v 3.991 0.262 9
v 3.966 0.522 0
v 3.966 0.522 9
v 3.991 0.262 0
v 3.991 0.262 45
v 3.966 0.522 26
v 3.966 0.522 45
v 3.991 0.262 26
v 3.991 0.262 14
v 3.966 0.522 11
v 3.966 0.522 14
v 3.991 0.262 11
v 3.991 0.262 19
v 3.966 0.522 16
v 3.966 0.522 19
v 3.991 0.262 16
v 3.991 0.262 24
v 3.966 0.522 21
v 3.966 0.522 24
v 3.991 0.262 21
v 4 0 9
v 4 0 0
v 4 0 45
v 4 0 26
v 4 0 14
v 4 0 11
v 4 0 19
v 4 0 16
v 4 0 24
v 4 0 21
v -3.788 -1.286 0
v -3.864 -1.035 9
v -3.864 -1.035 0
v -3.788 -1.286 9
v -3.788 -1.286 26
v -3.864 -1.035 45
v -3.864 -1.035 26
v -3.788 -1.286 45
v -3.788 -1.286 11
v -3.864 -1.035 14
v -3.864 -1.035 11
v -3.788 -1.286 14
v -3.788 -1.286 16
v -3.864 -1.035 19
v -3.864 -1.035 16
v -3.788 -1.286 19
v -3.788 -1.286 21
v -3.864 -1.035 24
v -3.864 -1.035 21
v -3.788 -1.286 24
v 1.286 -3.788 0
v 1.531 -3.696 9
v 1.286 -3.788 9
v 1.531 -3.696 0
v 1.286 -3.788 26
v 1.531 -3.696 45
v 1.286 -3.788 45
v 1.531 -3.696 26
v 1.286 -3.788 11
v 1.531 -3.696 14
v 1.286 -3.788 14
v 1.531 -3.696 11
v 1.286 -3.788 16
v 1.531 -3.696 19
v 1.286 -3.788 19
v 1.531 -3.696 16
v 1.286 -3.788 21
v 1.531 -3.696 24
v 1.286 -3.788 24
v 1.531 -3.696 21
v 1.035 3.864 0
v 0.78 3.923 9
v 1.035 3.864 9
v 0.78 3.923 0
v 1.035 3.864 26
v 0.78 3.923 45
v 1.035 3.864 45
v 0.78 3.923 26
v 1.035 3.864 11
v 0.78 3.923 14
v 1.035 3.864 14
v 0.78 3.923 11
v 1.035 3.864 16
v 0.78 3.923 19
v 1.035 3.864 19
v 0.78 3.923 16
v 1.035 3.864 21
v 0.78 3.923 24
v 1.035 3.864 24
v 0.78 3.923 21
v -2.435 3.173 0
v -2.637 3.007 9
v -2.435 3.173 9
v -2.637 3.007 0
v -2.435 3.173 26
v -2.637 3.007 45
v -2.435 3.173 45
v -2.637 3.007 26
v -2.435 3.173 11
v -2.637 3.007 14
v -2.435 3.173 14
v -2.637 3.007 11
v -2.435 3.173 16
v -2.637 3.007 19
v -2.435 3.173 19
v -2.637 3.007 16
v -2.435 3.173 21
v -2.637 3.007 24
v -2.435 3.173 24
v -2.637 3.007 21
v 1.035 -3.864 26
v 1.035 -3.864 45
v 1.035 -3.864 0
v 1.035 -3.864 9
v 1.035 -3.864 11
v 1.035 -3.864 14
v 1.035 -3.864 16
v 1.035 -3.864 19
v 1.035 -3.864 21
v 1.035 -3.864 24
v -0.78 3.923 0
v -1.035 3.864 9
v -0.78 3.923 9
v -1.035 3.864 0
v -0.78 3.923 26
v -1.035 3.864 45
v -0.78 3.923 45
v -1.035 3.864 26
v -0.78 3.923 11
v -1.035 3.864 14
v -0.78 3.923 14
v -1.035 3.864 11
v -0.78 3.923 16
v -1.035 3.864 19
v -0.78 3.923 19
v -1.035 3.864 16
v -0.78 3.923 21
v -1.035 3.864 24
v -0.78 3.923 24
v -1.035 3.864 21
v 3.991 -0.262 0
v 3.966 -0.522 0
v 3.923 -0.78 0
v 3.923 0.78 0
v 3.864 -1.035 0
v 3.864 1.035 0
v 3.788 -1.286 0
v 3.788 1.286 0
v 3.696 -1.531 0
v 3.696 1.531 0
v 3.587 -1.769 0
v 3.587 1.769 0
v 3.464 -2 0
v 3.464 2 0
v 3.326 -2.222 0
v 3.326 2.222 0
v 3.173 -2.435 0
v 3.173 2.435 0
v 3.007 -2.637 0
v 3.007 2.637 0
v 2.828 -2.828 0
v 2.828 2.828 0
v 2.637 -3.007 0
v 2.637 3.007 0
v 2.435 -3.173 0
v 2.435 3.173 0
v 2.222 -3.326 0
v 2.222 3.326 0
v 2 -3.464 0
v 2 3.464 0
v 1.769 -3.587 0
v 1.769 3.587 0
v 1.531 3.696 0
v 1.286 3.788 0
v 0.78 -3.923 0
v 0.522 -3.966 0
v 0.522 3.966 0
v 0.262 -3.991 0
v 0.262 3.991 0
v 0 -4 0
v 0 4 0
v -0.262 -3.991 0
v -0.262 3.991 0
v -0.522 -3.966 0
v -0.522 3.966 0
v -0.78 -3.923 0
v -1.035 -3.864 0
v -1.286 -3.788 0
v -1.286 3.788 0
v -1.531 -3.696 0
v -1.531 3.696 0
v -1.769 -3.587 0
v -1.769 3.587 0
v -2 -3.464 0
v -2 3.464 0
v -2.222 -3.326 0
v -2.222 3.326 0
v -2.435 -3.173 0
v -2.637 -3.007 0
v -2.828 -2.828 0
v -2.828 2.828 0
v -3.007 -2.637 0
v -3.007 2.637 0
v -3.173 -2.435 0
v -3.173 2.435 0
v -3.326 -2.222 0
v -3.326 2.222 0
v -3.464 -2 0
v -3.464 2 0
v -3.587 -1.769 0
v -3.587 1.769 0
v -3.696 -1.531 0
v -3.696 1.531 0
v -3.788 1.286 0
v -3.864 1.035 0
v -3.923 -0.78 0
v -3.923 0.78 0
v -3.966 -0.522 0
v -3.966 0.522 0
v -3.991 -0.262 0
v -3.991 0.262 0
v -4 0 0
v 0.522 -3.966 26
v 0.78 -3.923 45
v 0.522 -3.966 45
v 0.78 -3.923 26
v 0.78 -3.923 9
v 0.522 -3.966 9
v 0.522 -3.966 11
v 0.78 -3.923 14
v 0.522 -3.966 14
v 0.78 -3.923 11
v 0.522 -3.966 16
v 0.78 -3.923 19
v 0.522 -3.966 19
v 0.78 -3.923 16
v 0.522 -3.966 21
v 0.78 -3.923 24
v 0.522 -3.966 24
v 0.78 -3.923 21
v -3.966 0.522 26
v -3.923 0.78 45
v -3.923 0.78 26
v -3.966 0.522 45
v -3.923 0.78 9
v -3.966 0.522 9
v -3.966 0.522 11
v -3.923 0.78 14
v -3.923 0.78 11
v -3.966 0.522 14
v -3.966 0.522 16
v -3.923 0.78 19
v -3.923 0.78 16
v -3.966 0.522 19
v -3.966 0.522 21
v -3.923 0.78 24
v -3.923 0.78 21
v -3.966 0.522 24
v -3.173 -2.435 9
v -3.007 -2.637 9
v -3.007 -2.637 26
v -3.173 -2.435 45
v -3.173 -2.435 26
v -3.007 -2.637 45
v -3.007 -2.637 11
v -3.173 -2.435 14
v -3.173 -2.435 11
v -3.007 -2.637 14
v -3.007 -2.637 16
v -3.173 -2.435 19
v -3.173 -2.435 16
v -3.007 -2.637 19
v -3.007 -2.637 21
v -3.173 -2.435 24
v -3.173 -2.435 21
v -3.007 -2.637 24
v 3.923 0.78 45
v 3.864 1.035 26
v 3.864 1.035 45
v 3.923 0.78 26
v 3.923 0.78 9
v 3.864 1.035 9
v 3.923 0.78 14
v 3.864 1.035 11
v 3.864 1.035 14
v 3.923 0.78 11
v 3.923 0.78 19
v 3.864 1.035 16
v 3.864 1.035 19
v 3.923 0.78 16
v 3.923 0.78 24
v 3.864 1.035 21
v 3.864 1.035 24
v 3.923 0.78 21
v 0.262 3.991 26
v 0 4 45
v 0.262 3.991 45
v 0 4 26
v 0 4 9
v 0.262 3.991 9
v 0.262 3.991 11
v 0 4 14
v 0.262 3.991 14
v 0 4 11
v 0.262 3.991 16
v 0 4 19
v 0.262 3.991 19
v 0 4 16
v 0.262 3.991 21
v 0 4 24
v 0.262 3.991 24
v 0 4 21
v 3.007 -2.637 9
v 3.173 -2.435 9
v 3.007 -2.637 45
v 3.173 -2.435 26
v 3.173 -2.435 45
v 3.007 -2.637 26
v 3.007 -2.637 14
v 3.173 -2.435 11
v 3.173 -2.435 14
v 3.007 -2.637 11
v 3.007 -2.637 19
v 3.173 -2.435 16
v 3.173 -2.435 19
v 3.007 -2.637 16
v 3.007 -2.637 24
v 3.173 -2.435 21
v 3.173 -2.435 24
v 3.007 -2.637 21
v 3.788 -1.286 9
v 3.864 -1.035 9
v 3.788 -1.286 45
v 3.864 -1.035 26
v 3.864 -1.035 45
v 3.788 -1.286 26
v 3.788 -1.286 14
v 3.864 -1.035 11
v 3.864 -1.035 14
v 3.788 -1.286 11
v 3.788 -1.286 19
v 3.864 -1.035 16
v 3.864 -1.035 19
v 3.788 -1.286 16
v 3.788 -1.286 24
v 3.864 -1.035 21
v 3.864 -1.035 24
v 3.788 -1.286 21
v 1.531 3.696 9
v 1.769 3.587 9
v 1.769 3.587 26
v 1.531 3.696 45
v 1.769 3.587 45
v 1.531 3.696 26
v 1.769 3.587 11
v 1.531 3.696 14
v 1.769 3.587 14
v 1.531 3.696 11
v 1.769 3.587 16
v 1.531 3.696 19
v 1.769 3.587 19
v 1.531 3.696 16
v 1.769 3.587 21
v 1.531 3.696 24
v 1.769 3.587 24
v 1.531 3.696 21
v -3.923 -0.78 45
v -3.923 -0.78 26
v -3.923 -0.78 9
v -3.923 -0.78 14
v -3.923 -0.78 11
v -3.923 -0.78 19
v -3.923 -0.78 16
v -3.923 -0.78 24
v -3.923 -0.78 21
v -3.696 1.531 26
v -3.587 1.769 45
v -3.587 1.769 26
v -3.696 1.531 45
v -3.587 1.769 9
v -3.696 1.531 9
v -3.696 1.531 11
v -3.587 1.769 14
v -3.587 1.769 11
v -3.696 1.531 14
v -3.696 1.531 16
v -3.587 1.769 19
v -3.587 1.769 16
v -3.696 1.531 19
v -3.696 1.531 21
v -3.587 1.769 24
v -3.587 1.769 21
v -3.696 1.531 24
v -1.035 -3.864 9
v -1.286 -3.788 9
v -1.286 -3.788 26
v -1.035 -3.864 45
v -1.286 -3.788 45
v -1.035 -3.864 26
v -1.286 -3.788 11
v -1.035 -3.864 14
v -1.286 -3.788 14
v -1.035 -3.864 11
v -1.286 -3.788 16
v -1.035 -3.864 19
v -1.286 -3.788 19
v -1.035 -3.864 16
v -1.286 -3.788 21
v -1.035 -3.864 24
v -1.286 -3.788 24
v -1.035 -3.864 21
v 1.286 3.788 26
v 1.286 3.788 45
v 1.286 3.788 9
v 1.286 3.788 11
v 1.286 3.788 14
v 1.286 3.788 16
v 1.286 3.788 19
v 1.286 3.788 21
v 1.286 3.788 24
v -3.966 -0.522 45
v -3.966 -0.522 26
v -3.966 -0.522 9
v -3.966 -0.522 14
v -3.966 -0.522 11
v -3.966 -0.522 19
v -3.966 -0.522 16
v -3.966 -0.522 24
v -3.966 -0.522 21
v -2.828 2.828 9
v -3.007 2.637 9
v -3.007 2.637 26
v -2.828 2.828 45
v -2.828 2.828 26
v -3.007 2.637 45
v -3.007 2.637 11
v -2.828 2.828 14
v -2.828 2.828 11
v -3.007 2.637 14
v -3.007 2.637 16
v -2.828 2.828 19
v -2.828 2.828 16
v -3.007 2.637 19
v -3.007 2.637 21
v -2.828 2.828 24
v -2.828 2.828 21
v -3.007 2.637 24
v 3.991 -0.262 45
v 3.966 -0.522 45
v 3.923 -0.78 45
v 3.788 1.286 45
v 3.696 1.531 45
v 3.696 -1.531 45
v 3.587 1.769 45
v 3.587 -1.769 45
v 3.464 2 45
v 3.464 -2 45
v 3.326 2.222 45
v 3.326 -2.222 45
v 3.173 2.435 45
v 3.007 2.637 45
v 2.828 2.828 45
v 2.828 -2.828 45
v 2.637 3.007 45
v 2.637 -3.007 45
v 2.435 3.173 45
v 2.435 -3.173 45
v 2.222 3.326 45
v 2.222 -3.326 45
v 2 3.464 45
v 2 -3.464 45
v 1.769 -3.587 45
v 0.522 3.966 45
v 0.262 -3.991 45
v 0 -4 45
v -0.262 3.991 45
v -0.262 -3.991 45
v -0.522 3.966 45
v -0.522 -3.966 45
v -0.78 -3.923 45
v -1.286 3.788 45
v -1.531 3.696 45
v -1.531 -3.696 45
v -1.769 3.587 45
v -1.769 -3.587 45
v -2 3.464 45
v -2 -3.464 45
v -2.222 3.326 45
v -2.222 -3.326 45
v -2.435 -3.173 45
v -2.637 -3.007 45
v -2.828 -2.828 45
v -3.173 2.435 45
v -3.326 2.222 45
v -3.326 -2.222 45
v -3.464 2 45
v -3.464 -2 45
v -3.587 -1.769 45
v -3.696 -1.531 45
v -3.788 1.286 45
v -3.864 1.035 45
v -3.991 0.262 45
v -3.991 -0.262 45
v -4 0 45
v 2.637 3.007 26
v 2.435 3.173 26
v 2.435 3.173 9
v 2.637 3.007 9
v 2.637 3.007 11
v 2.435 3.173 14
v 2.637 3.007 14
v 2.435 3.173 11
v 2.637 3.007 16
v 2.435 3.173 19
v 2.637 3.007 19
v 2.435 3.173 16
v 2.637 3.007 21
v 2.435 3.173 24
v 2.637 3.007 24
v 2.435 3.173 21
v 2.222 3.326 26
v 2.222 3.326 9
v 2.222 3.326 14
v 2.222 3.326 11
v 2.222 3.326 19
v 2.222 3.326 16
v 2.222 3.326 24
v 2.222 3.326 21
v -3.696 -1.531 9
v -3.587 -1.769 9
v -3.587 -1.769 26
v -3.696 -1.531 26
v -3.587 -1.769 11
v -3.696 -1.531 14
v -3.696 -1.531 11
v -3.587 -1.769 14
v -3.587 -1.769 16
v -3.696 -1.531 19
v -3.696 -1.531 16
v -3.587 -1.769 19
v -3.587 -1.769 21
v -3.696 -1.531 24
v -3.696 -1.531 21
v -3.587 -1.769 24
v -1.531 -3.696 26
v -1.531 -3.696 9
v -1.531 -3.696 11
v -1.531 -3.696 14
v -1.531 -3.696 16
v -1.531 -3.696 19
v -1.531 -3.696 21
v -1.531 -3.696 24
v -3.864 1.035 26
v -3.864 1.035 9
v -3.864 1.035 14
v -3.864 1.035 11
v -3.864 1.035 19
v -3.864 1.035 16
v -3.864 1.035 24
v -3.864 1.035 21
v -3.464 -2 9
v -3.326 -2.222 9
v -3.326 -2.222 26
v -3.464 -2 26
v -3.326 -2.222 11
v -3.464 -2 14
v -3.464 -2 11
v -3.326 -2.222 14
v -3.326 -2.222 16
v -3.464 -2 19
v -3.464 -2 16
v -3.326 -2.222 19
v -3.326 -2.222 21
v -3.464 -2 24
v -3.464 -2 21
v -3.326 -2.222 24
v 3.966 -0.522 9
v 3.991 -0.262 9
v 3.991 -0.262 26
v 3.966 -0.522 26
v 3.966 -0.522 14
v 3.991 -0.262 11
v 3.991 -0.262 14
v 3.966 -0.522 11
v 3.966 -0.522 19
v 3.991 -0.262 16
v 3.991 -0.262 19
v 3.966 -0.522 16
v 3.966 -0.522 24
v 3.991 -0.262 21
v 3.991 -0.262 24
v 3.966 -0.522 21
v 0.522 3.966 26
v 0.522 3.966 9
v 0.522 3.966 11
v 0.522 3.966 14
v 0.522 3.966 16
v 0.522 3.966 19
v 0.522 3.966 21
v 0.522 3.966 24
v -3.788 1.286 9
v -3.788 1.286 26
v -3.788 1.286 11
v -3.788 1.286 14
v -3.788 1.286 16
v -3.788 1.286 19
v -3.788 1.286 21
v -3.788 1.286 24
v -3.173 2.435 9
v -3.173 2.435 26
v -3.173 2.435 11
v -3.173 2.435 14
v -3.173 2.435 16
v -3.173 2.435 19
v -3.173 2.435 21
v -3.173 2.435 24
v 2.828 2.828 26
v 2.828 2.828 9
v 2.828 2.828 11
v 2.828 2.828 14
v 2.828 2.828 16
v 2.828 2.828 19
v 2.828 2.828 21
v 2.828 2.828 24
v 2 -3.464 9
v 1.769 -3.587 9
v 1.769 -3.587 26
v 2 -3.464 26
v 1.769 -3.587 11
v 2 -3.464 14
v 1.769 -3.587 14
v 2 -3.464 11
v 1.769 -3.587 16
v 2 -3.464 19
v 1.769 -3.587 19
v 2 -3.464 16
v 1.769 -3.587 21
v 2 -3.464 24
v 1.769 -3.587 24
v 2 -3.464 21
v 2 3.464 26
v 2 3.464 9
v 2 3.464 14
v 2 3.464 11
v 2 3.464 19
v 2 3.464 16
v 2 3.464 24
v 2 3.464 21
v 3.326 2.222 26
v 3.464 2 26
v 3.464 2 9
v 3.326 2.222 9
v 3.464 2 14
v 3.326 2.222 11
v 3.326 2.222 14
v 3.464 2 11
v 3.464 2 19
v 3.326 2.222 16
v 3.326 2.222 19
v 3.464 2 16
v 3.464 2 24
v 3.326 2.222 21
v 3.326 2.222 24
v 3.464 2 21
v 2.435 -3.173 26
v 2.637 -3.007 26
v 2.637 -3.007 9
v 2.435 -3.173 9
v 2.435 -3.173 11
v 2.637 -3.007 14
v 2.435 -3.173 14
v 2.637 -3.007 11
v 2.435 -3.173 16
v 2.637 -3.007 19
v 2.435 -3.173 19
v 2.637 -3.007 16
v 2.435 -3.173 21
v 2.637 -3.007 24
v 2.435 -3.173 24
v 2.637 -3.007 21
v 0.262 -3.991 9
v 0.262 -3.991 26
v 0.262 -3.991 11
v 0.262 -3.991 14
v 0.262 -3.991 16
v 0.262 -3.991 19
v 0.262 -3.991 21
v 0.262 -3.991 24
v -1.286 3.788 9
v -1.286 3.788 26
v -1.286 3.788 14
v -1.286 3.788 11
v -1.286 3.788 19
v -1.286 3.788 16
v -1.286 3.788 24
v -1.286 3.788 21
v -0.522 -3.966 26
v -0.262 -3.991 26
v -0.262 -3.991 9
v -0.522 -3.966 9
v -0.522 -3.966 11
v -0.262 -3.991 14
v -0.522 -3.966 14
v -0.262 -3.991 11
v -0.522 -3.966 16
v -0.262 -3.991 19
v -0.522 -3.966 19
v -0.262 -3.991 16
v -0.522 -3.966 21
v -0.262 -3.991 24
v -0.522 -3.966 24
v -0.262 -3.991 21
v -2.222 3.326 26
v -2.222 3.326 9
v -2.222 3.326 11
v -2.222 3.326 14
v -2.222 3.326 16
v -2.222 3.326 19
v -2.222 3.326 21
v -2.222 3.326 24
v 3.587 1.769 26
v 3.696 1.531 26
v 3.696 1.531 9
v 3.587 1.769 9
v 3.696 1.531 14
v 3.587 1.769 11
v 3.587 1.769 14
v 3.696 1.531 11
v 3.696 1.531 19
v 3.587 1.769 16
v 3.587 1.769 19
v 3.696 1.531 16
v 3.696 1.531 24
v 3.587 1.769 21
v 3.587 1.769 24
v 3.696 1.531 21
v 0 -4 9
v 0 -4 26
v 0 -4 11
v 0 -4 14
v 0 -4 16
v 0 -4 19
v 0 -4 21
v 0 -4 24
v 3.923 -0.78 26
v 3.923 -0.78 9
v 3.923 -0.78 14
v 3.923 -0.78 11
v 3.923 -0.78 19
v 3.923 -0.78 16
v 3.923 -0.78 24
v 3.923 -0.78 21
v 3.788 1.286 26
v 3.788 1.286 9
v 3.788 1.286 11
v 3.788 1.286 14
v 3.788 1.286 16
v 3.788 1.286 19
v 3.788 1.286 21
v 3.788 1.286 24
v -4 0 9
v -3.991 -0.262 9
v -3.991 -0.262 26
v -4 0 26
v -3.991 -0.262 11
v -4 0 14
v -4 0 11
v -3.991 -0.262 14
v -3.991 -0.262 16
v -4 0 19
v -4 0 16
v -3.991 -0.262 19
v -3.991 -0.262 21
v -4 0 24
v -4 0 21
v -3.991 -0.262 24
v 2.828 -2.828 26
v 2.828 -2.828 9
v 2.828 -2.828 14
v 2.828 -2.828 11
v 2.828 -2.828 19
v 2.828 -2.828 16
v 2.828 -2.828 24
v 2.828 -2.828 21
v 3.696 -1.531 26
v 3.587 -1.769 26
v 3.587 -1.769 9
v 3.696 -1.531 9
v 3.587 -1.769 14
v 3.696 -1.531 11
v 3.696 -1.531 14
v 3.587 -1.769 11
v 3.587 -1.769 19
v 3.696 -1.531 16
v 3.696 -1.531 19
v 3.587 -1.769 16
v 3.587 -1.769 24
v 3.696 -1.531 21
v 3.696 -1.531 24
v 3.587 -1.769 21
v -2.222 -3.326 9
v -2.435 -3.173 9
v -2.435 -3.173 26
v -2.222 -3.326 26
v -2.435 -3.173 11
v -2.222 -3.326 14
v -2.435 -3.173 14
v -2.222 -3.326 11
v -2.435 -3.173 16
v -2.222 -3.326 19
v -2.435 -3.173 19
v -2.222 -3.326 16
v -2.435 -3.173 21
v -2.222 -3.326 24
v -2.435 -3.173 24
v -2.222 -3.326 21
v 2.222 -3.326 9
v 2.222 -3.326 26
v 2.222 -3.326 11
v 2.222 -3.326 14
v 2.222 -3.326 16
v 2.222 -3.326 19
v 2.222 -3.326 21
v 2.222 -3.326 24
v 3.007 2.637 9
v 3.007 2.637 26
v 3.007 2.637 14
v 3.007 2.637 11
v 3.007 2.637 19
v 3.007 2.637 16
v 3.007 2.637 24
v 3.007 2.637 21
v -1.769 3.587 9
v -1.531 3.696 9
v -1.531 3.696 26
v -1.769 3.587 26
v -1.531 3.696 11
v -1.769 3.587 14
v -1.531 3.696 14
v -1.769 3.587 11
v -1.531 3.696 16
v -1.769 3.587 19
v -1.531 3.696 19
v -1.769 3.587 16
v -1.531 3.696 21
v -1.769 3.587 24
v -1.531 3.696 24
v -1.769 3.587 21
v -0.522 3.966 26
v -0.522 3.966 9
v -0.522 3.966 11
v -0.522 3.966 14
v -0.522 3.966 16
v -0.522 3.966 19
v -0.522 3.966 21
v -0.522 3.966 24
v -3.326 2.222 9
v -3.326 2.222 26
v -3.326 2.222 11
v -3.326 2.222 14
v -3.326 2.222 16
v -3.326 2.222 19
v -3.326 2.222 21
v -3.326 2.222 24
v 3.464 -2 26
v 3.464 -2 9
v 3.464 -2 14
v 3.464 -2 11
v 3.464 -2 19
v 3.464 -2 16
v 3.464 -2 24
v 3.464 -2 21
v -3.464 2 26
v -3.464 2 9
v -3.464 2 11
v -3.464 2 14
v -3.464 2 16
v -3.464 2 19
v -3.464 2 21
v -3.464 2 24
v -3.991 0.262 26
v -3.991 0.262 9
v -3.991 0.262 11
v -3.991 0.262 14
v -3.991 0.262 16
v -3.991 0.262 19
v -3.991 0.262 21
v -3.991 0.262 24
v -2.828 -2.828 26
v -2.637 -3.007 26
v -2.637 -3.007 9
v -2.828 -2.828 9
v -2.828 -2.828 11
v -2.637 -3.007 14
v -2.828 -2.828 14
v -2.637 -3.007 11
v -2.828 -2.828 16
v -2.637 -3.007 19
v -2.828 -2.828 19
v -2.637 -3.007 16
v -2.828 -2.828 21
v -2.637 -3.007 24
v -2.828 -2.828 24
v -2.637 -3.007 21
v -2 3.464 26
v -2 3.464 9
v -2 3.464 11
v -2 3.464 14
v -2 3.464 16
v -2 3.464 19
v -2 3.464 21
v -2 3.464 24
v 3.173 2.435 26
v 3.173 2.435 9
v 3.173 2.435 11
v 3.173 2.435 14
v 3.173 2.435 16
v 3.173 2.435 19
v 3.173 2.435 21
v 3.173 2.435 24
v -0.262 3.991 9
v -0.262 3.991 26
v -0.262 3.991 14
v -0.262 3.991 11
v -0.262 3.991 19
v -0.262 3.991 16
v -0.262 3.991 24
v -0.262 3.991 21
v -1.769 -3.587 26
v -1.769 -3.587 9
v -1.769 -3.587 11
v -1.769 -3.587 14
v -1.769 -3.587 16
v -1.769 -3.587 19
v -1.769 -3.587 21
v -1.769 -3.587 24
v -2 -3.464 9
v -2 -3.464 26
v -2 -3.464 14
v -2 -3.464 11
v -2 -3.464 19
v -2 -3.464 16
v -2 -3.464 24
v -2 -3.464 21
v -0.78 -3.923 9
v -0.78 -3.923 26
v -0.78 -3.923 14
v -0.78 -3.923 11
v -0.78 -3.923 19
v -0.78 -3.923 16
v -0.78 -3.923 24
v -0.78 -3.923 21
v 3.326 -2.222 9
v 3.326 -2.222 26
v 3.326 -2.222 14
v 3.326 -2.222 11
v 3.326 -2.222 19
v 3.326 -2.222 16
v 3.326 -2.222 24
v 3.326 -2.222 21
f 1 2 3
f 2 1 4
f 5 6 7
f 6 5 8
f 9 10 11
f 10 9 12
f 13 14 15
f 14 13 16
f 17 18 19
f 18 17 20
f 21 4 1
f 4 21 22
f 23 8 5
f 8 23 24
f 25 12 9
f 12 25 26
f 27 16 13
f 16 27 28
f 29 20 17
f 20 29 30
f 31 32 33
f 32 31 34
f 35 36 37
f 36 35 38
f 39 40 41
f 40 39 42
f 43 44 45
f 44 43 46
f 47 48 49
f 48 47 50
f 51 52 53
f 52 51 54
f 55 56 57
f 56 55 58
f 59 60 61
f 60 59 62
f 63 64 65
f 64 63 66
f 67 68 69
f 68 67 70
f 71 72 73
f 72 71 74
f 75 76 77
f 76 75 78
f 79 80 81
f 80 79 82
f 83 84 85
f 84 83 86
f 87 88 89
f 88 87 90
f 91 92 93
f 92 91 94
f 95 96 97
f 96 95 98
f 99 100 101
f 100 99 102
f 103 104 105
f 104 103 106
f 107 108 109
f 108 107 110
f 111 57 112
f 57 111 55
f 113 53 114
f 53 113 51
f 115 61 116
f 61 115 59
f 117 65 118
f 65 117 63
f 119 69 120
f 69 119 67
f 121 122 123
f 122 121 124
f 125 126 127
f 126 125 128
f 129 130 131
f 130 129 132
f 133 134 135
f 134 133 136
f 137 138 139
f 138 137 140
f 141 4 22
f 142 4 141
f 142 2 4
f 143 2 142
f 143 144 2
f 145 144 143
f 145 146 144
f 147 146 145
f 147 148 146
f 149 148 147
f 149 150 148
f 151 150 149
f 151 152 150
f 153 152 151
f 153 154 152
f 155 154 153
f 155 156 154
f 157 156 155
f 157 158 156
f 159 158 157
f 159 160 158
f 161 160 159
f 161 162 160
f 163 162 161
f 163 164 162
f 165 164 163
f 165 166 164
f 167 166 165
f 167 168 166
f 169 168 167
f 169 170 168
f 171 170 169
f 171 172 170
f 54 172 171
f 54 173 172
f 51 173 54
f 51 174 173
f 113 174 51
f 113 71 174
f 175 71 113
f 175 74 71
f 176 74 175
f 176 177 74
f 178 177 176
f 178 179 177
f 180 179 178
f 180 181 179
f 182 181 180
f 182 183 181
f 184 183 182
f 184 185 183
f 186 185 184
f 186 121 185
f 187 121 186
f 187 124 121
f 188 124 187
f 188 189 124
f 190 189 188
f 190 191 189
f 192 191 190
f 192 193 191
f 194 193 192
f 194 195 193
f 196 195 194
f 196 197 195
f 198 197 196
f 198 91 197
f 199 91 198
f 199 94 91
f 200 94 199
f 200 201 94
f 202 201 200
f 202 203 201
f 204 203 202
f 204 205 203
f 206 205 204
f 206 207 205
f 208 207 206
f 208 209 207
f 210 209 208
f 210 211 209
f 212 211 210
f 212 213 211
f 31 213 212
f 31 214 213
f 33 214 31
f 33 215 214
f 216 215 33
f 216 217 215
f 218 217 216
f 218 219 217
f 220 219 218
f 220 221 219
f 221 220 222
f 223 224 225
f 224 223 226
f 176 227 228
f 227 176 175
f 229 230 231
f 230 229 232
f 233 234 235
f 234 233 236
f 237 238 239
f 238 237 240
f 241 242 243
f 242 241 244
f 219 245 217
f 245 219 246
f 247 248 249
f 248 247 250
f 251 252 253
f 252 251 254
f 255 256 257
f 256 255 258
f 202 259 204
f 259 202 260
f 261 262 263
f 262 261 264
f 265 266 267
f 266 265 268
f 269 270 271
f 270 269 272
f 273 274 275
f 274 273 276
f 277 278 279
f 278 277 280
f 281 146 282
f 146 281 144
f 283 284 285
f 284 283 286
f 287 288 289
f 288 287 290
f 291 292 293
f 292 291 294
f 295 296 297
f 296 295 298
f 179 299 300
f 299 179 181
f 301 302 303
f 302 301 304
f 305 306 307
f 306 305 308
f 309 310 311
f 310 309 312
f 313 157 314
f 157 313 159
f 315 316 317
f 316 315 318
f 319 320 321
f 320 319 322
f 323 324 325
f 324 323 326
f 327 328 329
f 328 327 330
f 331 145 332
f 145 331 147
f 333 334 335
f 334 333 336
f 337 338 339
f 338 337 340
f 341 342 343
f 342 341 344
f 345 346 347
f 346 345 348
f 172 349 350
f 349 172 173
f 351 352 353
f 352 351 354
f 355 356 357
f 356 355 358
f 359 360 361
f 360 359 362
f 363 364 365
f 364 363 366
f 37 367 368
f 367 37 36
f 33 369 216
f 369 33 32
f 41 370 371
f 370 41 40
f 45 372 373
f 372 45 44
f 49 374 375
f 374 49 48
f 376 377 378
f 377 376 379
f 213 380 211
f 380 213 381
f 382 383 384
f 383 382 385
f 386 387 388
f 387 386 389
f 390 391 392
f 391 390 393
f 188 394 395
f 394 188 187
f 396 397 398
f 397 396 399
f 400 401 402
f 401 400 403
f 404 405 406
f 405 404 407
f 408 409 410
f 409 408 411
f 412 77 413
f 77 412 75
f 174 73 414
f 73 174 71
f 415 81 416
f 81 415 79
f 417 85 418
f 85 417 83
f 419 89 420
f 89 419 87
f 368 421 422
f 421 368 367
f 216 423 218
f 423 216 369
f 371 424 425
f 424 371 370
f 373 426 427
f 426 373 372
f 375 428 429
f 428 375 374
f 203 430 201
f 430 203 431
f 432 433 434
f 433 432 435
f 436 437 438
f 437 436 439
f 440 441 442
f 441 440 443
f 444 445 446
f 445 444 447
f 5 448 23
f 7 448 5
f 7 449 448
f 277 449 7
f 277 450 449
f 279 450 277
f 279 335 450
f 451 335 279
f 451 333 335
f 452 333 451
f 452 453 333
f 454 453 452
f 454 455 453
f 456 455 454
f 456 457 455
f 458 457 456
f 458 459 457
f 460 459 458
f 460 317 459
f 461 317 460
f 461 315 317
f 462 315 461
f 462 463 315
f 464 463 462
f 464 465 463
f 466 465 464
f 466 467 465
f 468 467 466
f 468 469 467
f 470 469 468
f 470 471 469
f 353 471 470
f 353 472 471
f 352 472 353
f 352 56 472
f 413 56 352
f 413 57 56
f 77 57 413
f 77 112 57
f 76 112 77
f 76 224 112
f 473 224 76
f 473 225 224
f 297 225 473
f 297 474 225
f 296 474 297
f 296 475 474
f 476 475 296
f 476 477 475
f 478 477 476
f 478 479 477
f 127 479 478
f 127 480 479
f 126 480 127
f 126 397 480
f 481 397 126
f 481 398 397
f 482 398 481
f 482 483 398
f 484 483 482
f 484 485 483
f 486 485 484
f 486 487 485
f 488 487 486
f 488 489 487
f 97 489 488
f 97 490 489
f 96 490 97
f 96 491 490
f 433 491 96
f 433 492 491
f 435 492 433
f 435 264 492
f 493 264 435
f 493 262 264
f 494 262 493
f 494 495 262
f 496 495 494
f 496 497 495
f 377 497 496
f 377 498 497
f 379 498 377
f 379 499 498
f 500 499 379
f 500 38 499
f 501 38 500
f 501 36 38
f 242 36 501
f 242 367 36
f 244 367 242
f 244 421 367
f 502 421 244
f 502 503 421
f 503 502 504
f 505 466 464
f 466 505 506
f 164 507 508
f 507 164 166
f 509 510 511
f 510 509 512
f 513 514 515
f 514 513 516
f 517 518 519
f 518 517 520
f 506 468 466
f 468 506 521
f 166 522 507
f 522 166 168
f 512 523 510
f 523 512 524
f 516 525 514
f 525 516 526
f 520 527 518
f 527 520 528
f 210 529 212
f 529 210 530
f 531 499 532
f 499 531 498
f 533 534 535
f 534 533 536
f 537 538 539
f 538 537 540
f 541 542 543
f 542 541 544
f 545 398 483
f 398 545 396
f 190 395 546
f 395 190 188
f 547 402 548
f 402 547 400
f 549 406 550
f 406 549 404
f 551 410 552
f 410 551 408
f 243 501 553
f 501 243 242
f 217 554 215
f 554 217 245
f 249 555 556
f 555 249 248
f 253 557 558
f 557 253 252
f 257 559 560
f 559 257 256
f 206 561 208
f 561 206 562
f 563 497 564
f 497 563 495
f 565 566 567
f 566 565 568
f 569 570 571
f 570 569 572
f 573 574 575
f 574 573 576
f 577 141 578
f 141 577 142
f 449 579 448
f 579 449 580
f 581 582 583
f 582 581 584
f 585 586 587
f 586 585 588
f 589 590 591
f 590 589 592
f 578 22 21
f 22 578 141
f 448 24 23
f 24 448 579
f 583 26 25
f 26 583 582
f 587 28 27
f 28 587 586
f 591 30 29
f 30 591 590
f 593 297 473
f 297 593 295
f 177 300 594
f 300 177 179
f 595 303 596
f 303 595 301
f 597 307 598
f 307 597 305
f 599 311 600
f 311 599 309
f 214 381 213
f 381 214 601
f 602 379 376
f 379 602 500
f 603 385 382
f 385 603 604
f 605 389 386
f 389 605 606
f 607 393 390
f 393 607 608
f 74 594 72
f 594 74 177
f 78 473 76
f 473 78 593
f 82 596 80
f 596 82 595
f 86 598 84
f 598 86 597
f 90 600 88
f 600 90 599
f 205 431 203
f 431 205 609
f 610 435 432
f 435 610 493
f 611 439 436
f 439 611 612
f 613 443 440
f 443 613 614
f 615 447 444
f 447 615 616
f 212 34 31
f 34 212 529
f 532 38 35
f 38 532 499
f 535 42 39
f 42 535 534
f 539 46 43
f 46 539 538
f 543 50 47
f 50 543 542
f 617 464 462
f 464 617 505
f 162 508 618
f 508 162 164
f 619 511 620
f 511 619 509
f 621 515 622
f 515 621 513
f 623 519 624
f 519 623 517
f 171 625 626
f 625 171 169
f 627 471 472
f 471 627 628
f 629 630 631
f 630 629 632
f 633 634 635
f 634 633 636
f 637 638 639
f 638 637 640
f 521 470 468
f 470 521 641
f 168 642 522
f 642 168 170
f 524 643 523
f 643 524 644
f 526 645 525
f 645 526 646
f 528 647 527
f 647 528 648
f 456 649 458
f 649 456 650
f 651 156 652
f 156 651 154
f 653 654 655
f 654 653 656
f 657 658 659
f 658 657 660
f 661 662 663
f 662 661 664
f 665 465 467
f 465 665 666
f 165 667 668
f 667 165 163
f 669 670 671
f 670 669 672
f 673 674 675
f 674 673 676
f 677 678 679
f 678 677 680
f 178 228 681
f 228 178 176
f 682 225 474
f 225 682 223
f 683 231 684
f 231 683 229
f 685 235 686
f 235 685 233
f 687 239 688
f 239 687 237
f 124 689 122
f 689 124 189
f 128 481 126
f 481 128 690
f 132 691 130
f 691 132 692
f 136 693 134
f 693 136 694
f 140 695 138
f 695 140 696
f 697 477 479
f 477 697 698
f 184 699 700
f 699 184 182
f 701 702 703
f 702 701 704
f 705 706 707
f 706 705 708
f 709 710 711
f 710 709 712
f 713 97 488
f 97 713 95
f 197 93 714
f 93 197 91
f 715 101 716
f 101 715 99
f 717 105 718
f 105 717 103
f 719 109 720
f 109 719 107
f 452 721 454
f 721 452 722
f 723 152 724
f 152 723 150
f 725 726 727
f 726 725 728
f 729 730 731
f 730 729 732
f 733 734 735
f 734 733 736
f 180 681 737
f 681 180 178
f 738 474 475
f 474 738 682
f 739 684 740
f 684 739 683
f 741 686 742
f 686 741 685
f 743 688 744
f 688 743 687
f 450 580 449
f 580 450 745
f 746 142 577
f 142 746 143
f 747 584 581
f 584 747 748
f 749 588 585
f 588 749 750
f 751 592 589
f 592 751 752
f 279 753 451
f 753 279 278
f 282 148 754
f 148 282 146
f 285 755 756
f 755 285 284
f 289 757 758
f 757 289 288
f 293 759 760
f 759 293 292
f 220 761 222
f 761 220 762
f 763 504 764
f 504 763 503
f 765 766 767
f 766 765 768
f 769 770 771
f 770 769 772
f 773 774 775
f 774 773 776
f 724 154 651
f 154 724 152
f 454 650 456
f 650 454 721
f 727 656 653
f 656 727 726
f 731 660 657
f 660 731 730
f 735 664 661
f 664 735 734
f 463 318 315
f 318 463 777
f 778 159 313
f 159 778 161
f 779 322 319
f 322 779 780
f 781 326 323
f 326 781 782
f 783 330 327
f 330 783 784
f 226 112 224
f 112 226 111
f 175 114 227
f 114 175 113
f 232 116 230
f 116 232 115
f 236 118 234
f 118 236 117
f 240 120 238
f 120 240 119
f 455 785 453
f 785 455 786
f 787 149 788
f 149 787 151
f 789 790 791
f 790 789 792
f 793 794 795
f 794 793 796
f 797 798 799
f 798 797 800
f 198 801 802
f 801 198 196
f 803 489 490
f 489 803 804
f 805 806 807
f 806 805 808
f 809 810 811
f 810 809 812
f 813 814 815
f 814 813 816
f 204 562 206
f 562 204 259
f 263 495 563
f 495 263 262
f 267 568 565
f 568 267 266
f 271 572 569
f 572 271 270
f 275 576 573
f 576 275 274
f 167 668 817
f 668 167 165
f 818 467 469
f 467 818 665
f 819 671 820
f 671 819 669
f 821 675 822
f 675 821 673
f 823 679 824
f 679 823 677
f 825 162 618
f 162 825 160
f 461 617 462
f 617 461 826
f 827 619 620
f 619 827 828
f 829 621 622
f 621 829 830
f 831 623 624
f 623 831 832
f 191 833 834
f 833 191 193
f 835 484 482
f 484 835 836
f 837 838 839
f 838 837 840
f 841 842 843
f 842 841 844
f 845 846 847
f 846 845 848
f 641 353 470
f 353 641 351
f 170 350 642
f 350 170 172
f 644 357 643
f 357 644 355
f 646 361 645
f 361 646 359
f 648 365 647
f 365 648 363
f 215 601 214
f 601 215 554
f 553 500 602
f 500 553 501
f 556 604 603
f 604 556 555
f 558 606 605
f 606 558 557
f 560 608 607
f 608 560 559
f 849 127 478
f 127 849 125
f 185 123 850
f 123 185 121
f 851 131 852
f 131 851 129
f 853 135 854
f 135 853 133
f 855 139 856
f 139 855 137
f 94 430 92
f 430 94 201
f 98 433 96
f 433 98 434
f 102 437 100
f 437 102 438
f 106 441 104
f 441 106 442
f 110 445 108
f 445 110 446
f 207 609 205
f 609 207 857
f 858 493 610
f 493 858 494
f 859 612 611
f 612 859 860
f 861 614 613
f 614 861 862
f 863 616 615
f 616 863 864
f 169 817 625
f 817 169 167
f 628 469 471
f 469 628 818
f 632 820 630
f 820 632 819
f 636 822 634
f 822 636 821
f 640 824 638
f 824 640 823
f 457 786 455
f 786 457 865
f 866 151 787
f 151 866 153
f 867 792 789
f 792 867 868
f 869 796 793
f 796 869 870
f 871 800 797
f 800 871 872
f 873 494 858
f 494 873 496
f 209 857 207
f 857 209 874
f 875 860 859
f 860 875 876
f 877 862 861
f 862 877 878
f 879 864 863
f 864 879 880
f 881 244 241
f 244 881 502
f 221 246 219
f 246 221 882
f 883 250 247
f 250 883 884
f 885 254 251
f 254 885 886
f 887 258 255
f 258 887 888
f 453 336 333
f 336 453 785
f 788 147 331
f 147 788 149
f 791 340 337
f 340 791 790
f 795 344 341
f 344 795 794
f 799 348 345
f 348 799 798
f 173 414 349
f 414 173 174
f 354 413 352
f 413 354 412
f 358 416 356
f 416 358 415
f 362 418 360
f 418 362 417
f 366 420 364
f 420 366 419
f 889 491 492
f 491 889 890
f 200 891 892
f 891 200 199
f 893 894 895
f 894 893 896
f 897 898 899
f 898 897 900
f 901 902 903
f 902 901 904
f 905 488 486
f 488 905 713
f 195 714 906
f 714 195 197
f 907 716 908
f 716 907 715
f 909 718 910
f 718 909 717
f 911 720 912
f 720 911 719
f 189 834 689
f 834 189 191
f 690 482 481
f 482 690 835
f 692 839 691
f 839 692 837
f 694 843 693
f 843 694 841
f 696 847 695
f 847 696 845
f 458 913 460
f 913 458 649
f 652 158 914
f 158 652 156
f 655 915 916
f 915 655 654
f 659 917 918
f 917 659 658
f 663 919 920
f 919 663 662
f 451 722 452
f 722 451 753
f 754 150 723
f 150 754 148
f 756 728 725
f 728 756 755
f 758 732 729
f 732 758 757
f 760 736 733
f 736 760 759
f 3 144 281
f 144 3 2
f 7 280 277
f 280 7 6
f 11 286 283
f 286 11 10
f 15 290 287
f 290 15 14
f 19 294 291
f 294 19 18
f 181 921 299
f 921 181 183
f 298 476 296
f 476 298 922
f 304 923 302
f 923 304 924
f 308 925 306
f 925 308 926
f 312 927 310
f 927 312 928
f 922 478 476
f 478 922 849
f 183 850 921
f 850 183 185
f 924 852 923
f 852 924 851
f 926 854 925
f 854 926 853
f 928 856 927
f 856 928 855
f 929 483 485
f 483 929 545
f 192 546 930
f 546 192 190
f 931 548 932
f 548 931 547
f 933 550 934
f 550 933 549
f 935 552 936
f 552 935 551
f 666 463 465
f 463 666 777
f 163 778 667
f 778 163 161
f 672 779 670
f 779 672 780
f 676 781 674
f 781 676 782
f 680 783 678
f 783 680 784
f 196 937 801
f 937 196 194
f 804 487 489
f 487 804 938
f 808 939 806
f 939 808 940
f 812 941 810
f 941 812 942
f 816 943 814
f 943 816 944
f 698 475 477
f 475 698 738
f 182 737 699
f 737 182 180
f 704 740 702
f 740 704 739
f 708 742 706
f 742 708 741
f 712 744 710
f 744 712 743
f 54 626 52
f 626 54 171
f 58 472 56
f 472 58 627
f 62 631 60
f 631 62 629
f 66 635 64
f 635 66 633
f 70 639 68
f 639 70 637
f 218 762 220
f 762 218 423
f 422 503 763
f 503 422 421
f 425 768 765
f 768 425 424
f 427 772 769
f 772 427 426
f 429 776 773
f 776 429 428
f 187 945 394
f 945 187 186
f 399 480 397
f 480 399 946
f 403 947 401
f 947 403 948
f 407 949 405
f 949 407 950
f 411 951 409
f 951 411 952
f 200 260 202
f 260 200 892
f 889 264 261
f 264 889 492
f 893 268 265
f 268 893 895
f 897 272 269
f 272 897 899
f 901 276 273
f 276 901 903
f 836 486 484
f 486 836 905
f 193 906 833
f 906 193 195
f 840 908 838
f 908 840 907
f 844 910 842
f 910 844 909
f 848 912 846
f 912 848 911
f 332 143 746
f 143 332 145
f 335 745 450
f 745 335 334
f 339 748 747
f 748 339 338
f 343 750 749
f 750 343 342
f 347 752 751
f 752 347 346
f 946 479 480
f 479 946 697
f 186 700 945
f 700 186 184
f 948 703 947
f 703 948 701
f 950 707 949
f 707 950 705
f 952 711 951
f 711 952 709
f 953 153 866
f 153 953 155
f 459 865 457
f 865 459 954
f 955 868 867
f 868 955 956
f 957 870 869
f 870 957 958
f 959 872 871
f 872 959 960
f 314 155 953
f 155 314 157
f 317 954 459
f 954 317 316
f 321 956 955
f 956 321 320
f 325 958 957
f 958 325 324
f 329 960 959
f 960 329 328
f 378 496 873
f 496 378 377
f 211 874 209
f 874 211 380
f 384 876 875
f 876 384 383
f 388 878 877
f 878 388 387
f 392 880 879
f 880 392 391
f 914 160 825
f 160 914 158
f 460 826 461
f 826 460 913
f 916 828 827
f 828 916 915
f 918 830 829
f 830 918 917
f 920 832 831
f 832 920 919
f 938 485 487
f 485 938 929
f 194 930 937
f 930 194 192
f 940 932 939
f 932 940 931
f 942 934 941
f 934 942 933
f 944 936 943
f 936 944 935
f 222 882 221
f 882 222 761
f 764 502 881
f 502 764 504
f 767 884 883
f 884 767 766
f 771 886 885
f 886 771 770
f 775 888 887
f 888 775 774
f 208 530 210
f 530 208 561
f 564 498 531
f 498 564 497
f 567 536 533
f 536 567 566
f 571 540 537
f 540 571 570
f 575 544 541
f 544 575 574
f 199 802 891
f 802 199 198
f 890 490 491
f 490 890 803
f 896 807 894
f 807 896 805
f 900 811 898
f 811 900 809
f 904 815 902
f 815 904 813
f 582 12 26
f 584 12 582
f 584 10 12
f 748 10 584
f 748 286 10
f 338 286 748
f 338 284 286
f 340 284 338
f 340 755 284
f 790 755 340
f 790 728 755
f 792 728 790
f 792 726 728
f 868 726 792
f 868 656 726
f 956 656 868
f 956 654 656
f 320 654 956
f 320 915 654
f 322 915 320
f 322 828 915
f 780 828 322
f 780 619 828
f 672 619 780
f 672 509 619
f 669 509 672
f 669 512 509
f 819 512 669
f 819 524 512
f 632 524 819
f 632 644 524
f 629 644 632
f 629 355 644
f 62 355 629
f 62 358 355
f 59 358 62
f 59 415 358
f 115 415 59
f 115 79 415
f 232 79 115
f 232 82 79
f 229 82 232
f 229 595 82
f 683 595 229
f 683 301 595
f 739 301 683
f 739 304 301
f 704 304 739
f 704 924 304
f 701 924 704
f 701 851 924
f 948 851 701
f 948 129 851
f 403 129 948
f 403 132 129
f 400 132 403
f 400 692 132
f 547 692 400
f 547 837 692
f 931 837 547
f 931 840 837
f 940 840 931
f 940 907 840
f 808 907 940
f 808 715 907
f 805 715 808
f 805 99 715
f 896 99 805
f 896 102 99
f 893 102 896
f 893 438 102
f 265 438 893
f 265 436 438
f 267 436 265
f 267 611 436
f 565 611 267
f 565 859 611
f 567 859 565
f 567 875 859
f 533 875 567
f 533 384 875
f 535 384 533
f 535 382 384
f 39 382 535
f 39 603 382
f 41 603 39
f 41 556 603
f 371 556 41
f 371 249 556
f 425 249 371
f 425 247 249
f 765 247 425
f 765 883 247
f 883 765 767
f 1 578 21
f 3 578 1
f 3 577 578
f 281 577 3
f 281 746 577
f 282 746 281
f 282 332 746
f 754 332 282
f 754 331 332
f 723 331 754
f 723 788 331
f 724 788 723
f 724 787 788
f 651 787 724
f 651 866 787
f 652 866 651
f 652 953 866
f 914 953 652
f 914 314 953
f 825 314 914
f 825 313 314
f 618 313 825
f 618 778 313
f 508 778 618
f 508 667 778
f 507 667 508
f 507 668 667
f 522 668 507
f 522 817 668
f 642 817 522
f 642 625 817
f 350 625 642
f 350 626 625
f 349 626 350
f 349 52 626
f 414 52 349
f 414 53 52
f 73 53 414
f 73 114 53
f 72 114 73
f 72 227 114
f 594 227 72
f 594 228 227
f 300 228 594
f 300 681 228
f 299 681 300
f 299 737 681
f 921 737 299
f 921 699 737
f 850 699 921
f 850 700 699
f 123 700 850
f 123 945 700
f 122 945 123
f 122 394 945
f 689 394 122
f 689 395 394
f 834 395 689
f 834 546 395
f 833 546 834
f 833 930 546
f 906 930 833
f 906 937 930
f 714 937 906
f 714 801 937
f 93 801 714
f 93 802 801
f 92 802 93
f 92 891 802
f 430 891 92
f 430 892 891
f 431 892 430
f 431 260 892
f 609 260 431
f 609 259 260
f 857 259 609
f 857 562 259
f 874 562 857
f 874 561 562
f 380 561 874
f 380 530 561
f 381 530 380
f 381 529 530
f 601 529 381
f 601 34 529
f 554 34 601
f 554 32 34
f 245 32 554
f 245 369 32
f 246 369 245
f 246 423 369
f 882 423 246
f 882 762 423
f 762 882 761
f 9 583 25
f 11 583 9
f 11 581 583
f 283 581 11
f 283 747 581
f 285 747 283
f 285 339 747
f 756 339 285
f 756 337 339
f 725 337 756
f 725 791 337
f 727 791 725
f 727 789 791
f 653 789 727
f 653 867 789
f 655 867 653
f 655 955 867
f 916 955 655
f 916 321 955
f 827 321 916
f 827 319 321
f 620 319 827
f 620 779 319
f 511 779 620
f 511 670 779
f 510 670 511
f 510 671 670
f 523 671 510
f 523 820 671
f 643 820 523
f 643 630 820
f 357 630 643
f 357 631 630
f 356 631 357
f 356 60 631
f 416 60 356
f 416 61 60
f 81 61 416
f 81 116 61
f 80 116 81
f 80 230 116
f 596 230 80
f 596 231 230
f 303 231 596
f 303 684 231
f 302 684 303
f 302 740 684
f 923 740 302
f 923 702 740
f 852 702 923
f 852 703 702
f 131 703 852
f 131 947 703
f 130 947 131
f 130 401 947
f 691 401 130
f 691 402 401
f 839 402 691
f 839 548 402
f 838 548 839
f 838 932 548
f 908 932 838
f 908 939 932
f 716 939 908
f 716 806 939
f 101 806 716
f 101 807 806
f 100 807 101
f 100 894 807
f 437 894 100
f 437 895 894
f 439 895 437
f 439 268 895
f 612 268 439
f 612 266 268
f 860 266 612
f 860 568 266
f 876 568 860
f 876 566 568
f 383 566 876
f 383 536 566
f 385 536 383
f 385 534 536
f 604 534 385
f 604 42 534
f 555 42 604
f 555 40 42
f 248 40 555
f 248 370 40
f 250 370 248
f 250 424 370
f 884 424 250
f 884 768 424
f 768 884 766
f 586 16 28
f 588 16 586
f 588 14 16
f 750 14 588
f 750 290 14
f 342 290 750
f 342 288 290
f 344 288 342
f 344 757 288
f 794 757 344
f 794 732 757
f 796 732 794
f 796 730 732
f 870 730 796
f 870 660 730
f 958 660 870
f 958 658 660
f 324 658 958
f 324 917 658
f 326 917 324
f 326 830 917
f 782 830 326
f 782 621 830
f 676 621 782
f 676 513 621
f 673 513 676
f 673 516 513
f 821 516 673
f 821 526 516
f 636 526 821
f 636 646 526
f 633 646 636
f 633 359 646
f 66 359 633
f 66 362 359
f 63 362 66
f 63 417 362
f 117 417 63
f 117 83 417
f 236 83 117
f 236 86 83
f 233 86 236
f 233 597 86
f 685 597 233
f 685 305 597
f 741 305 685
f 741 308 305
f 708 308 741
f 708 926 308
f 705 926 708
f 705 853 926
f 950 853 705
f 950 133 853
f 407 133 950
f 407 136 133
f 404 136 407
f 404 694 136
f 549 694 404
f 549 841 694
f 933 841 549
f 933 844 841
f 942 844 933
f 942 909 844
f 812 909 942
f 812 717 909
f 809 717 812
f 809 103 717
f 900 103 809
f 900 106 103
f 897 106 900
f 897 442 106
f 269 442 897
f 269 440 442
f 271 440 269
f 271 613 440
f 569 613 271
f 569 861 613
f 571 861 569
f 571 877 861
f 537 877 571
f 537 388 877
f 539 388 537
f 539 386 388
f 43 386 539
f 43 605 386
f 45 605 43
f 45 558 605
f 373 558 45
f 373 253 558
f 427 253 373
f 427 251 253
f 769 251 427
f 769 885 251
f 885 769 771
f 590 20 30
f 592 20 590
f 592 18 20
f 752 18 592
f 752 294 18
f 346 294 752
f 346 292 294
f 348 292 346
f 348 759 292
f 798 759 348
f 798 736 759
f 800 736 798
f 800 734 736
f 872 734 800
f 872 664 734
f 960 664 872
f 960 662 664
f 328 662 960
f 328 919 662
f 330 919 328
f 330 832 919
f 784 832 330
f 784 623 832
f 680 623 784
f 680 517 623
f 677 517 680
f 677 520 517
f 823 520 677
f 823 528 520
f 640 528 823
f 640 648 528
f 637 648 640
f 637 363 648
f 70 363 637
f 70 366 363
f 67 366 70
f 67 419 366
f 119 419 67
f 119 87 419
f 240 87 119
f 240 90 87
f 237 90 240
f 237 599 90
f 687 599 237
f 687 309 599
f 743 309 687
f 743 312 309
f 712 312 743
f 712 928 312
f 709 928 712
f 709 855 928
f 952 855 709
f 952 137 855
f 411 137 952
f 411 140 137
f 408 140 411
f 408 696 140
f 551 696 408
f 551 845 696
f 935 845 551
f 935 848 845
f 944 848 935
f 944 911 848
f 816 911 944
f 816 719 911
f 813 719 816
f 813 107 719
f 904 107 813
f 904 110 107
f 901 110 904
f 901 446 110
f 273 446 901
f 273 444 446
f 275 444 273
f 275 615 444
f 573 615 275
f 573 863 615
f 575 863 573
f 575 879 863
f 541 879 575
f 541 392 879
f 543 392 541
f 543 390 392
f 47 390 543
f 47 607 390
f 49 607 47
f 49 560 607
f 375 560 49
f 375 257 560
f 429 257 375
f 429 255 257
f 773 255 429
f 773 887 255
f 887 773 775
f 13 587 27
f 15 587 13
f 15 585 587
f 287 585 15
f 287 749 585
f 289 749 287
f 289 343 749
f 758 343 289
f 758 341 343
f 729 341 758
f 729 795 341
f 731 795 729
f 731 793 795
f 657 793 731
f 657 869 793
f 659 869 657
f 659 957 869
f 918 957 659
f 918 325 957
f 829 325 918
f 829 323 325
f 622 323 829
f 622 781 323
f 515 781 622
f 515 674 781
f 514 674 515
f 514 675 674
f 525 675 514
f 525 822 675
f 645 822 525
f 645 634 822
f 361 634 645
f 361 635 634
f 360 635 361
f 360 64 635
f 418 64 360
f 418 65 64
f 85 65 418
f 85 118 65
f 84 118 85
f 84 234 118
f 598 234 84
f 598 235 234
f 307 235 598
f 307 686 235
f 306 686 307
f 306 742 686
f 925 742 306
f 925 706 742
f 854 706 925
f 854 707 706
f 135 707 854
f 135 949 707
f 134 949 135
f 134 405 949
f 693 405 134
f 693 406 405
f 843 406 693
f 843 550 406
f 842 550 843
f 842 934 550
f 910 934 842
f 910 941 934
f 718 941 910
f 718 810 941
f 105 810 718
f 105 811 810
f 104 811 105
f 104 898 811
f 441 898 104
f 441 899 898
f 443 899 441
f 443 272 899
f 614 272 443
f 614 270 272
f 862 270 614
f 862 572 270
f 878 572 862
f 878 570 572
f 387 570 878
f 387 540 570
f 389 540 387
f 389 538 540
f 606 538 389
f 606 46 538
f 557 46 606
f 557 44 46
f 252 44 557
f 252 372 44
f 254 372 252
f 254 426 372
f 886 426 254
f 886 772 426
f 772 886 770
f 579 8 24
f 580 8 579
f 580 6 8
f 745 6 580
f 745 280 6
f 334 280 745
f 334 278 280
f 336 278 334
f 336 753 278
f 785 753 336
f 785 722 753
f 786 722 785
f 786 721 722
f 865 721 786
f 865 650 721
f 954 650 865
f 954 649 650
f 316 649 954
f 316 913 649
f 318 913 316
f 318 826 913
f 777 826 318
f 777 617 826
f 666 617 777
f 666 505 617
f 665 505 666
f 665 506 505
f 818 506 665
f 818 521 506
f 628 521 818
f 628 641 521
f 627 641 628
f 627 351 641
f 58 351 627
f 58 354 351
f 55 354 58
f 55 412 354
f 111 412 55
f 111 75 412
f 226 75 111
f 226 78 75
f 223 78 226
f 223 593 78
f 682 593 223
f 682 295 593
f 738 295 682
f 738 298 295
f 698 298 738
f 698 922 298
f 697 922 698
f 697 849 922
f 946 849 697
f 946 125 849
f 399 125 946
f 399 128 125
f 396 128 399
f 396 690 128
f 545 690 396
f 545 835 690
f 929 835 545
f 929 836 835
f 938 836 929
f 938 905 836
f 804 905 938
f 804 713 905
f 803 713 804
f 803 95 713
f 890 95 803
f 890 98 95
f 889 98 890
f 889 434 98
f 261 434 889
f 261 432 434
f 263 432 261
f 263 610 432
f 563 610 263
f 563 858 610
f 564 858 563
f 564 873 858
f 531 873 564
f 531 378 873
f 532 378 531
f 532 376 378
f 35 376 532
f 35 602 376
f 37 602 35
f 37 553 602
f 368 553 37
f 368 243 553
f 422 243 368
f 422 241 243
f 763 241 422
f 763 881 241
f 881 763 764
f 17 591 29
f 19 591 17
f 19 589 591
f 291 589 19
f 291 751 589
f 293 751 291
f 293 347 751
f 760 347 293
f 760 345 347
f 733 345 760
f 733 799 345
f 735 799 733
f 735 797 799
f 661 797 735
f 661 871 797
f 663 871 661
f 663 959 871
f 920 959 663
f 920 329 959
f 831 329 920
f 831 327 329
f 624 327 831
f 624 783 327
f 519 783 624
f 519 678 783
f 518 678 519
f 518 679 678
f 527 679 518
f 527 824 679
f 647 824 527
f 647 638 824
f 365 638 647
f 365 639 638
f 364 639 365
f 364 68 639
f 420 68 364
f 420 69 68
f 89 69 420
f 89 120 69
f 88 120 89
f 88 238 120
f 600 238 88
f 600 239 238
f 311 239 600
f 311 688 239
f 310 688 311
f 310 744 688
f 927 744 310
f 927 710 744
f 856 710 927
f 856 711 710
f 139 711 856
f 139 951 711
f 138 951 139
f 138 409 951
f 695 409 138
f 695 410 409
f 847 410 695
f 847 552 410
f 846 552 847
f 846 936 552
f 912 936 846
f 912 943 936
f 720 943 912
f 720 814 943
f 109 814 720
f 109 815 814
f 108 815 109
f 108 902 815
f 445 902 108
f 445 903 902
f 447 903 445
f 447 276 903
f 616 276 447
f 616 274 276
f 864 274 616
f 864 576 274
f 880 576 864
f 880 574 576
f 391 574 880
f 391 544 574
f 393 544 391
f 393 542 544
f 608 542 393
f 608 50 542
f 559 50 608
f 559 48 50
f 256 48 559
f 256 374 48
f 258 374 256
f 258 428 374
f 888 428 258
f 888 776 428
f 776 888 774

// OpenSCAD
// Pestle for grinding tissue inside a 1.5 mL microcentrifuge tube
// Print orientation: standing upright, bottom on the bed (z = 0)

$fn = 96;

// ---- Dimensions (mm) ----
handle_d      = 8;    // handle diameter
handle_h      = 45;   // handle height (z = 0 to 45)
cone_top_d    = 8;    // cone diameter at top of handle (z = 45)
cone_tip_d    = 3;    // cone diameter at tip (z = 62)
tip_d         = 3;    // sphere tip diameter, centred at z = 62
groove_count  = 4;    // number of circumferential grooves
groove_w      = 2;    // groove width in Z
groove_depth  = 1;    // groove depth into handle
groove_z      = [10, 15, 20, 25]; // groove centre heights

eps           = 0.5;  // overshoot for clean boolean cuts

// ---- Model ----
difference() {
    union() {
        // Handle
        cylinder(d = handle_d, h = handle_h);

        // Cone from z = 45 to z = 62
        translate([0, 0, handle_h])
            cylinder(d1 = cone_top_d, d2 = cone_tip_d, h = cone_tip_d - handle_h);

        // Rounded tip: sphere centred at z = 62
        translate([0, 0, cone_tip_d])
            sphere(d = tip_d);
    }

    // Grip grooves, cut through the full diameter of the handle
    for (z = groove_z)
        translate([0, 0, z - groove_w / 2])
            cylinder(d = handle_d + 2 * eps, h = groove_w);
}
